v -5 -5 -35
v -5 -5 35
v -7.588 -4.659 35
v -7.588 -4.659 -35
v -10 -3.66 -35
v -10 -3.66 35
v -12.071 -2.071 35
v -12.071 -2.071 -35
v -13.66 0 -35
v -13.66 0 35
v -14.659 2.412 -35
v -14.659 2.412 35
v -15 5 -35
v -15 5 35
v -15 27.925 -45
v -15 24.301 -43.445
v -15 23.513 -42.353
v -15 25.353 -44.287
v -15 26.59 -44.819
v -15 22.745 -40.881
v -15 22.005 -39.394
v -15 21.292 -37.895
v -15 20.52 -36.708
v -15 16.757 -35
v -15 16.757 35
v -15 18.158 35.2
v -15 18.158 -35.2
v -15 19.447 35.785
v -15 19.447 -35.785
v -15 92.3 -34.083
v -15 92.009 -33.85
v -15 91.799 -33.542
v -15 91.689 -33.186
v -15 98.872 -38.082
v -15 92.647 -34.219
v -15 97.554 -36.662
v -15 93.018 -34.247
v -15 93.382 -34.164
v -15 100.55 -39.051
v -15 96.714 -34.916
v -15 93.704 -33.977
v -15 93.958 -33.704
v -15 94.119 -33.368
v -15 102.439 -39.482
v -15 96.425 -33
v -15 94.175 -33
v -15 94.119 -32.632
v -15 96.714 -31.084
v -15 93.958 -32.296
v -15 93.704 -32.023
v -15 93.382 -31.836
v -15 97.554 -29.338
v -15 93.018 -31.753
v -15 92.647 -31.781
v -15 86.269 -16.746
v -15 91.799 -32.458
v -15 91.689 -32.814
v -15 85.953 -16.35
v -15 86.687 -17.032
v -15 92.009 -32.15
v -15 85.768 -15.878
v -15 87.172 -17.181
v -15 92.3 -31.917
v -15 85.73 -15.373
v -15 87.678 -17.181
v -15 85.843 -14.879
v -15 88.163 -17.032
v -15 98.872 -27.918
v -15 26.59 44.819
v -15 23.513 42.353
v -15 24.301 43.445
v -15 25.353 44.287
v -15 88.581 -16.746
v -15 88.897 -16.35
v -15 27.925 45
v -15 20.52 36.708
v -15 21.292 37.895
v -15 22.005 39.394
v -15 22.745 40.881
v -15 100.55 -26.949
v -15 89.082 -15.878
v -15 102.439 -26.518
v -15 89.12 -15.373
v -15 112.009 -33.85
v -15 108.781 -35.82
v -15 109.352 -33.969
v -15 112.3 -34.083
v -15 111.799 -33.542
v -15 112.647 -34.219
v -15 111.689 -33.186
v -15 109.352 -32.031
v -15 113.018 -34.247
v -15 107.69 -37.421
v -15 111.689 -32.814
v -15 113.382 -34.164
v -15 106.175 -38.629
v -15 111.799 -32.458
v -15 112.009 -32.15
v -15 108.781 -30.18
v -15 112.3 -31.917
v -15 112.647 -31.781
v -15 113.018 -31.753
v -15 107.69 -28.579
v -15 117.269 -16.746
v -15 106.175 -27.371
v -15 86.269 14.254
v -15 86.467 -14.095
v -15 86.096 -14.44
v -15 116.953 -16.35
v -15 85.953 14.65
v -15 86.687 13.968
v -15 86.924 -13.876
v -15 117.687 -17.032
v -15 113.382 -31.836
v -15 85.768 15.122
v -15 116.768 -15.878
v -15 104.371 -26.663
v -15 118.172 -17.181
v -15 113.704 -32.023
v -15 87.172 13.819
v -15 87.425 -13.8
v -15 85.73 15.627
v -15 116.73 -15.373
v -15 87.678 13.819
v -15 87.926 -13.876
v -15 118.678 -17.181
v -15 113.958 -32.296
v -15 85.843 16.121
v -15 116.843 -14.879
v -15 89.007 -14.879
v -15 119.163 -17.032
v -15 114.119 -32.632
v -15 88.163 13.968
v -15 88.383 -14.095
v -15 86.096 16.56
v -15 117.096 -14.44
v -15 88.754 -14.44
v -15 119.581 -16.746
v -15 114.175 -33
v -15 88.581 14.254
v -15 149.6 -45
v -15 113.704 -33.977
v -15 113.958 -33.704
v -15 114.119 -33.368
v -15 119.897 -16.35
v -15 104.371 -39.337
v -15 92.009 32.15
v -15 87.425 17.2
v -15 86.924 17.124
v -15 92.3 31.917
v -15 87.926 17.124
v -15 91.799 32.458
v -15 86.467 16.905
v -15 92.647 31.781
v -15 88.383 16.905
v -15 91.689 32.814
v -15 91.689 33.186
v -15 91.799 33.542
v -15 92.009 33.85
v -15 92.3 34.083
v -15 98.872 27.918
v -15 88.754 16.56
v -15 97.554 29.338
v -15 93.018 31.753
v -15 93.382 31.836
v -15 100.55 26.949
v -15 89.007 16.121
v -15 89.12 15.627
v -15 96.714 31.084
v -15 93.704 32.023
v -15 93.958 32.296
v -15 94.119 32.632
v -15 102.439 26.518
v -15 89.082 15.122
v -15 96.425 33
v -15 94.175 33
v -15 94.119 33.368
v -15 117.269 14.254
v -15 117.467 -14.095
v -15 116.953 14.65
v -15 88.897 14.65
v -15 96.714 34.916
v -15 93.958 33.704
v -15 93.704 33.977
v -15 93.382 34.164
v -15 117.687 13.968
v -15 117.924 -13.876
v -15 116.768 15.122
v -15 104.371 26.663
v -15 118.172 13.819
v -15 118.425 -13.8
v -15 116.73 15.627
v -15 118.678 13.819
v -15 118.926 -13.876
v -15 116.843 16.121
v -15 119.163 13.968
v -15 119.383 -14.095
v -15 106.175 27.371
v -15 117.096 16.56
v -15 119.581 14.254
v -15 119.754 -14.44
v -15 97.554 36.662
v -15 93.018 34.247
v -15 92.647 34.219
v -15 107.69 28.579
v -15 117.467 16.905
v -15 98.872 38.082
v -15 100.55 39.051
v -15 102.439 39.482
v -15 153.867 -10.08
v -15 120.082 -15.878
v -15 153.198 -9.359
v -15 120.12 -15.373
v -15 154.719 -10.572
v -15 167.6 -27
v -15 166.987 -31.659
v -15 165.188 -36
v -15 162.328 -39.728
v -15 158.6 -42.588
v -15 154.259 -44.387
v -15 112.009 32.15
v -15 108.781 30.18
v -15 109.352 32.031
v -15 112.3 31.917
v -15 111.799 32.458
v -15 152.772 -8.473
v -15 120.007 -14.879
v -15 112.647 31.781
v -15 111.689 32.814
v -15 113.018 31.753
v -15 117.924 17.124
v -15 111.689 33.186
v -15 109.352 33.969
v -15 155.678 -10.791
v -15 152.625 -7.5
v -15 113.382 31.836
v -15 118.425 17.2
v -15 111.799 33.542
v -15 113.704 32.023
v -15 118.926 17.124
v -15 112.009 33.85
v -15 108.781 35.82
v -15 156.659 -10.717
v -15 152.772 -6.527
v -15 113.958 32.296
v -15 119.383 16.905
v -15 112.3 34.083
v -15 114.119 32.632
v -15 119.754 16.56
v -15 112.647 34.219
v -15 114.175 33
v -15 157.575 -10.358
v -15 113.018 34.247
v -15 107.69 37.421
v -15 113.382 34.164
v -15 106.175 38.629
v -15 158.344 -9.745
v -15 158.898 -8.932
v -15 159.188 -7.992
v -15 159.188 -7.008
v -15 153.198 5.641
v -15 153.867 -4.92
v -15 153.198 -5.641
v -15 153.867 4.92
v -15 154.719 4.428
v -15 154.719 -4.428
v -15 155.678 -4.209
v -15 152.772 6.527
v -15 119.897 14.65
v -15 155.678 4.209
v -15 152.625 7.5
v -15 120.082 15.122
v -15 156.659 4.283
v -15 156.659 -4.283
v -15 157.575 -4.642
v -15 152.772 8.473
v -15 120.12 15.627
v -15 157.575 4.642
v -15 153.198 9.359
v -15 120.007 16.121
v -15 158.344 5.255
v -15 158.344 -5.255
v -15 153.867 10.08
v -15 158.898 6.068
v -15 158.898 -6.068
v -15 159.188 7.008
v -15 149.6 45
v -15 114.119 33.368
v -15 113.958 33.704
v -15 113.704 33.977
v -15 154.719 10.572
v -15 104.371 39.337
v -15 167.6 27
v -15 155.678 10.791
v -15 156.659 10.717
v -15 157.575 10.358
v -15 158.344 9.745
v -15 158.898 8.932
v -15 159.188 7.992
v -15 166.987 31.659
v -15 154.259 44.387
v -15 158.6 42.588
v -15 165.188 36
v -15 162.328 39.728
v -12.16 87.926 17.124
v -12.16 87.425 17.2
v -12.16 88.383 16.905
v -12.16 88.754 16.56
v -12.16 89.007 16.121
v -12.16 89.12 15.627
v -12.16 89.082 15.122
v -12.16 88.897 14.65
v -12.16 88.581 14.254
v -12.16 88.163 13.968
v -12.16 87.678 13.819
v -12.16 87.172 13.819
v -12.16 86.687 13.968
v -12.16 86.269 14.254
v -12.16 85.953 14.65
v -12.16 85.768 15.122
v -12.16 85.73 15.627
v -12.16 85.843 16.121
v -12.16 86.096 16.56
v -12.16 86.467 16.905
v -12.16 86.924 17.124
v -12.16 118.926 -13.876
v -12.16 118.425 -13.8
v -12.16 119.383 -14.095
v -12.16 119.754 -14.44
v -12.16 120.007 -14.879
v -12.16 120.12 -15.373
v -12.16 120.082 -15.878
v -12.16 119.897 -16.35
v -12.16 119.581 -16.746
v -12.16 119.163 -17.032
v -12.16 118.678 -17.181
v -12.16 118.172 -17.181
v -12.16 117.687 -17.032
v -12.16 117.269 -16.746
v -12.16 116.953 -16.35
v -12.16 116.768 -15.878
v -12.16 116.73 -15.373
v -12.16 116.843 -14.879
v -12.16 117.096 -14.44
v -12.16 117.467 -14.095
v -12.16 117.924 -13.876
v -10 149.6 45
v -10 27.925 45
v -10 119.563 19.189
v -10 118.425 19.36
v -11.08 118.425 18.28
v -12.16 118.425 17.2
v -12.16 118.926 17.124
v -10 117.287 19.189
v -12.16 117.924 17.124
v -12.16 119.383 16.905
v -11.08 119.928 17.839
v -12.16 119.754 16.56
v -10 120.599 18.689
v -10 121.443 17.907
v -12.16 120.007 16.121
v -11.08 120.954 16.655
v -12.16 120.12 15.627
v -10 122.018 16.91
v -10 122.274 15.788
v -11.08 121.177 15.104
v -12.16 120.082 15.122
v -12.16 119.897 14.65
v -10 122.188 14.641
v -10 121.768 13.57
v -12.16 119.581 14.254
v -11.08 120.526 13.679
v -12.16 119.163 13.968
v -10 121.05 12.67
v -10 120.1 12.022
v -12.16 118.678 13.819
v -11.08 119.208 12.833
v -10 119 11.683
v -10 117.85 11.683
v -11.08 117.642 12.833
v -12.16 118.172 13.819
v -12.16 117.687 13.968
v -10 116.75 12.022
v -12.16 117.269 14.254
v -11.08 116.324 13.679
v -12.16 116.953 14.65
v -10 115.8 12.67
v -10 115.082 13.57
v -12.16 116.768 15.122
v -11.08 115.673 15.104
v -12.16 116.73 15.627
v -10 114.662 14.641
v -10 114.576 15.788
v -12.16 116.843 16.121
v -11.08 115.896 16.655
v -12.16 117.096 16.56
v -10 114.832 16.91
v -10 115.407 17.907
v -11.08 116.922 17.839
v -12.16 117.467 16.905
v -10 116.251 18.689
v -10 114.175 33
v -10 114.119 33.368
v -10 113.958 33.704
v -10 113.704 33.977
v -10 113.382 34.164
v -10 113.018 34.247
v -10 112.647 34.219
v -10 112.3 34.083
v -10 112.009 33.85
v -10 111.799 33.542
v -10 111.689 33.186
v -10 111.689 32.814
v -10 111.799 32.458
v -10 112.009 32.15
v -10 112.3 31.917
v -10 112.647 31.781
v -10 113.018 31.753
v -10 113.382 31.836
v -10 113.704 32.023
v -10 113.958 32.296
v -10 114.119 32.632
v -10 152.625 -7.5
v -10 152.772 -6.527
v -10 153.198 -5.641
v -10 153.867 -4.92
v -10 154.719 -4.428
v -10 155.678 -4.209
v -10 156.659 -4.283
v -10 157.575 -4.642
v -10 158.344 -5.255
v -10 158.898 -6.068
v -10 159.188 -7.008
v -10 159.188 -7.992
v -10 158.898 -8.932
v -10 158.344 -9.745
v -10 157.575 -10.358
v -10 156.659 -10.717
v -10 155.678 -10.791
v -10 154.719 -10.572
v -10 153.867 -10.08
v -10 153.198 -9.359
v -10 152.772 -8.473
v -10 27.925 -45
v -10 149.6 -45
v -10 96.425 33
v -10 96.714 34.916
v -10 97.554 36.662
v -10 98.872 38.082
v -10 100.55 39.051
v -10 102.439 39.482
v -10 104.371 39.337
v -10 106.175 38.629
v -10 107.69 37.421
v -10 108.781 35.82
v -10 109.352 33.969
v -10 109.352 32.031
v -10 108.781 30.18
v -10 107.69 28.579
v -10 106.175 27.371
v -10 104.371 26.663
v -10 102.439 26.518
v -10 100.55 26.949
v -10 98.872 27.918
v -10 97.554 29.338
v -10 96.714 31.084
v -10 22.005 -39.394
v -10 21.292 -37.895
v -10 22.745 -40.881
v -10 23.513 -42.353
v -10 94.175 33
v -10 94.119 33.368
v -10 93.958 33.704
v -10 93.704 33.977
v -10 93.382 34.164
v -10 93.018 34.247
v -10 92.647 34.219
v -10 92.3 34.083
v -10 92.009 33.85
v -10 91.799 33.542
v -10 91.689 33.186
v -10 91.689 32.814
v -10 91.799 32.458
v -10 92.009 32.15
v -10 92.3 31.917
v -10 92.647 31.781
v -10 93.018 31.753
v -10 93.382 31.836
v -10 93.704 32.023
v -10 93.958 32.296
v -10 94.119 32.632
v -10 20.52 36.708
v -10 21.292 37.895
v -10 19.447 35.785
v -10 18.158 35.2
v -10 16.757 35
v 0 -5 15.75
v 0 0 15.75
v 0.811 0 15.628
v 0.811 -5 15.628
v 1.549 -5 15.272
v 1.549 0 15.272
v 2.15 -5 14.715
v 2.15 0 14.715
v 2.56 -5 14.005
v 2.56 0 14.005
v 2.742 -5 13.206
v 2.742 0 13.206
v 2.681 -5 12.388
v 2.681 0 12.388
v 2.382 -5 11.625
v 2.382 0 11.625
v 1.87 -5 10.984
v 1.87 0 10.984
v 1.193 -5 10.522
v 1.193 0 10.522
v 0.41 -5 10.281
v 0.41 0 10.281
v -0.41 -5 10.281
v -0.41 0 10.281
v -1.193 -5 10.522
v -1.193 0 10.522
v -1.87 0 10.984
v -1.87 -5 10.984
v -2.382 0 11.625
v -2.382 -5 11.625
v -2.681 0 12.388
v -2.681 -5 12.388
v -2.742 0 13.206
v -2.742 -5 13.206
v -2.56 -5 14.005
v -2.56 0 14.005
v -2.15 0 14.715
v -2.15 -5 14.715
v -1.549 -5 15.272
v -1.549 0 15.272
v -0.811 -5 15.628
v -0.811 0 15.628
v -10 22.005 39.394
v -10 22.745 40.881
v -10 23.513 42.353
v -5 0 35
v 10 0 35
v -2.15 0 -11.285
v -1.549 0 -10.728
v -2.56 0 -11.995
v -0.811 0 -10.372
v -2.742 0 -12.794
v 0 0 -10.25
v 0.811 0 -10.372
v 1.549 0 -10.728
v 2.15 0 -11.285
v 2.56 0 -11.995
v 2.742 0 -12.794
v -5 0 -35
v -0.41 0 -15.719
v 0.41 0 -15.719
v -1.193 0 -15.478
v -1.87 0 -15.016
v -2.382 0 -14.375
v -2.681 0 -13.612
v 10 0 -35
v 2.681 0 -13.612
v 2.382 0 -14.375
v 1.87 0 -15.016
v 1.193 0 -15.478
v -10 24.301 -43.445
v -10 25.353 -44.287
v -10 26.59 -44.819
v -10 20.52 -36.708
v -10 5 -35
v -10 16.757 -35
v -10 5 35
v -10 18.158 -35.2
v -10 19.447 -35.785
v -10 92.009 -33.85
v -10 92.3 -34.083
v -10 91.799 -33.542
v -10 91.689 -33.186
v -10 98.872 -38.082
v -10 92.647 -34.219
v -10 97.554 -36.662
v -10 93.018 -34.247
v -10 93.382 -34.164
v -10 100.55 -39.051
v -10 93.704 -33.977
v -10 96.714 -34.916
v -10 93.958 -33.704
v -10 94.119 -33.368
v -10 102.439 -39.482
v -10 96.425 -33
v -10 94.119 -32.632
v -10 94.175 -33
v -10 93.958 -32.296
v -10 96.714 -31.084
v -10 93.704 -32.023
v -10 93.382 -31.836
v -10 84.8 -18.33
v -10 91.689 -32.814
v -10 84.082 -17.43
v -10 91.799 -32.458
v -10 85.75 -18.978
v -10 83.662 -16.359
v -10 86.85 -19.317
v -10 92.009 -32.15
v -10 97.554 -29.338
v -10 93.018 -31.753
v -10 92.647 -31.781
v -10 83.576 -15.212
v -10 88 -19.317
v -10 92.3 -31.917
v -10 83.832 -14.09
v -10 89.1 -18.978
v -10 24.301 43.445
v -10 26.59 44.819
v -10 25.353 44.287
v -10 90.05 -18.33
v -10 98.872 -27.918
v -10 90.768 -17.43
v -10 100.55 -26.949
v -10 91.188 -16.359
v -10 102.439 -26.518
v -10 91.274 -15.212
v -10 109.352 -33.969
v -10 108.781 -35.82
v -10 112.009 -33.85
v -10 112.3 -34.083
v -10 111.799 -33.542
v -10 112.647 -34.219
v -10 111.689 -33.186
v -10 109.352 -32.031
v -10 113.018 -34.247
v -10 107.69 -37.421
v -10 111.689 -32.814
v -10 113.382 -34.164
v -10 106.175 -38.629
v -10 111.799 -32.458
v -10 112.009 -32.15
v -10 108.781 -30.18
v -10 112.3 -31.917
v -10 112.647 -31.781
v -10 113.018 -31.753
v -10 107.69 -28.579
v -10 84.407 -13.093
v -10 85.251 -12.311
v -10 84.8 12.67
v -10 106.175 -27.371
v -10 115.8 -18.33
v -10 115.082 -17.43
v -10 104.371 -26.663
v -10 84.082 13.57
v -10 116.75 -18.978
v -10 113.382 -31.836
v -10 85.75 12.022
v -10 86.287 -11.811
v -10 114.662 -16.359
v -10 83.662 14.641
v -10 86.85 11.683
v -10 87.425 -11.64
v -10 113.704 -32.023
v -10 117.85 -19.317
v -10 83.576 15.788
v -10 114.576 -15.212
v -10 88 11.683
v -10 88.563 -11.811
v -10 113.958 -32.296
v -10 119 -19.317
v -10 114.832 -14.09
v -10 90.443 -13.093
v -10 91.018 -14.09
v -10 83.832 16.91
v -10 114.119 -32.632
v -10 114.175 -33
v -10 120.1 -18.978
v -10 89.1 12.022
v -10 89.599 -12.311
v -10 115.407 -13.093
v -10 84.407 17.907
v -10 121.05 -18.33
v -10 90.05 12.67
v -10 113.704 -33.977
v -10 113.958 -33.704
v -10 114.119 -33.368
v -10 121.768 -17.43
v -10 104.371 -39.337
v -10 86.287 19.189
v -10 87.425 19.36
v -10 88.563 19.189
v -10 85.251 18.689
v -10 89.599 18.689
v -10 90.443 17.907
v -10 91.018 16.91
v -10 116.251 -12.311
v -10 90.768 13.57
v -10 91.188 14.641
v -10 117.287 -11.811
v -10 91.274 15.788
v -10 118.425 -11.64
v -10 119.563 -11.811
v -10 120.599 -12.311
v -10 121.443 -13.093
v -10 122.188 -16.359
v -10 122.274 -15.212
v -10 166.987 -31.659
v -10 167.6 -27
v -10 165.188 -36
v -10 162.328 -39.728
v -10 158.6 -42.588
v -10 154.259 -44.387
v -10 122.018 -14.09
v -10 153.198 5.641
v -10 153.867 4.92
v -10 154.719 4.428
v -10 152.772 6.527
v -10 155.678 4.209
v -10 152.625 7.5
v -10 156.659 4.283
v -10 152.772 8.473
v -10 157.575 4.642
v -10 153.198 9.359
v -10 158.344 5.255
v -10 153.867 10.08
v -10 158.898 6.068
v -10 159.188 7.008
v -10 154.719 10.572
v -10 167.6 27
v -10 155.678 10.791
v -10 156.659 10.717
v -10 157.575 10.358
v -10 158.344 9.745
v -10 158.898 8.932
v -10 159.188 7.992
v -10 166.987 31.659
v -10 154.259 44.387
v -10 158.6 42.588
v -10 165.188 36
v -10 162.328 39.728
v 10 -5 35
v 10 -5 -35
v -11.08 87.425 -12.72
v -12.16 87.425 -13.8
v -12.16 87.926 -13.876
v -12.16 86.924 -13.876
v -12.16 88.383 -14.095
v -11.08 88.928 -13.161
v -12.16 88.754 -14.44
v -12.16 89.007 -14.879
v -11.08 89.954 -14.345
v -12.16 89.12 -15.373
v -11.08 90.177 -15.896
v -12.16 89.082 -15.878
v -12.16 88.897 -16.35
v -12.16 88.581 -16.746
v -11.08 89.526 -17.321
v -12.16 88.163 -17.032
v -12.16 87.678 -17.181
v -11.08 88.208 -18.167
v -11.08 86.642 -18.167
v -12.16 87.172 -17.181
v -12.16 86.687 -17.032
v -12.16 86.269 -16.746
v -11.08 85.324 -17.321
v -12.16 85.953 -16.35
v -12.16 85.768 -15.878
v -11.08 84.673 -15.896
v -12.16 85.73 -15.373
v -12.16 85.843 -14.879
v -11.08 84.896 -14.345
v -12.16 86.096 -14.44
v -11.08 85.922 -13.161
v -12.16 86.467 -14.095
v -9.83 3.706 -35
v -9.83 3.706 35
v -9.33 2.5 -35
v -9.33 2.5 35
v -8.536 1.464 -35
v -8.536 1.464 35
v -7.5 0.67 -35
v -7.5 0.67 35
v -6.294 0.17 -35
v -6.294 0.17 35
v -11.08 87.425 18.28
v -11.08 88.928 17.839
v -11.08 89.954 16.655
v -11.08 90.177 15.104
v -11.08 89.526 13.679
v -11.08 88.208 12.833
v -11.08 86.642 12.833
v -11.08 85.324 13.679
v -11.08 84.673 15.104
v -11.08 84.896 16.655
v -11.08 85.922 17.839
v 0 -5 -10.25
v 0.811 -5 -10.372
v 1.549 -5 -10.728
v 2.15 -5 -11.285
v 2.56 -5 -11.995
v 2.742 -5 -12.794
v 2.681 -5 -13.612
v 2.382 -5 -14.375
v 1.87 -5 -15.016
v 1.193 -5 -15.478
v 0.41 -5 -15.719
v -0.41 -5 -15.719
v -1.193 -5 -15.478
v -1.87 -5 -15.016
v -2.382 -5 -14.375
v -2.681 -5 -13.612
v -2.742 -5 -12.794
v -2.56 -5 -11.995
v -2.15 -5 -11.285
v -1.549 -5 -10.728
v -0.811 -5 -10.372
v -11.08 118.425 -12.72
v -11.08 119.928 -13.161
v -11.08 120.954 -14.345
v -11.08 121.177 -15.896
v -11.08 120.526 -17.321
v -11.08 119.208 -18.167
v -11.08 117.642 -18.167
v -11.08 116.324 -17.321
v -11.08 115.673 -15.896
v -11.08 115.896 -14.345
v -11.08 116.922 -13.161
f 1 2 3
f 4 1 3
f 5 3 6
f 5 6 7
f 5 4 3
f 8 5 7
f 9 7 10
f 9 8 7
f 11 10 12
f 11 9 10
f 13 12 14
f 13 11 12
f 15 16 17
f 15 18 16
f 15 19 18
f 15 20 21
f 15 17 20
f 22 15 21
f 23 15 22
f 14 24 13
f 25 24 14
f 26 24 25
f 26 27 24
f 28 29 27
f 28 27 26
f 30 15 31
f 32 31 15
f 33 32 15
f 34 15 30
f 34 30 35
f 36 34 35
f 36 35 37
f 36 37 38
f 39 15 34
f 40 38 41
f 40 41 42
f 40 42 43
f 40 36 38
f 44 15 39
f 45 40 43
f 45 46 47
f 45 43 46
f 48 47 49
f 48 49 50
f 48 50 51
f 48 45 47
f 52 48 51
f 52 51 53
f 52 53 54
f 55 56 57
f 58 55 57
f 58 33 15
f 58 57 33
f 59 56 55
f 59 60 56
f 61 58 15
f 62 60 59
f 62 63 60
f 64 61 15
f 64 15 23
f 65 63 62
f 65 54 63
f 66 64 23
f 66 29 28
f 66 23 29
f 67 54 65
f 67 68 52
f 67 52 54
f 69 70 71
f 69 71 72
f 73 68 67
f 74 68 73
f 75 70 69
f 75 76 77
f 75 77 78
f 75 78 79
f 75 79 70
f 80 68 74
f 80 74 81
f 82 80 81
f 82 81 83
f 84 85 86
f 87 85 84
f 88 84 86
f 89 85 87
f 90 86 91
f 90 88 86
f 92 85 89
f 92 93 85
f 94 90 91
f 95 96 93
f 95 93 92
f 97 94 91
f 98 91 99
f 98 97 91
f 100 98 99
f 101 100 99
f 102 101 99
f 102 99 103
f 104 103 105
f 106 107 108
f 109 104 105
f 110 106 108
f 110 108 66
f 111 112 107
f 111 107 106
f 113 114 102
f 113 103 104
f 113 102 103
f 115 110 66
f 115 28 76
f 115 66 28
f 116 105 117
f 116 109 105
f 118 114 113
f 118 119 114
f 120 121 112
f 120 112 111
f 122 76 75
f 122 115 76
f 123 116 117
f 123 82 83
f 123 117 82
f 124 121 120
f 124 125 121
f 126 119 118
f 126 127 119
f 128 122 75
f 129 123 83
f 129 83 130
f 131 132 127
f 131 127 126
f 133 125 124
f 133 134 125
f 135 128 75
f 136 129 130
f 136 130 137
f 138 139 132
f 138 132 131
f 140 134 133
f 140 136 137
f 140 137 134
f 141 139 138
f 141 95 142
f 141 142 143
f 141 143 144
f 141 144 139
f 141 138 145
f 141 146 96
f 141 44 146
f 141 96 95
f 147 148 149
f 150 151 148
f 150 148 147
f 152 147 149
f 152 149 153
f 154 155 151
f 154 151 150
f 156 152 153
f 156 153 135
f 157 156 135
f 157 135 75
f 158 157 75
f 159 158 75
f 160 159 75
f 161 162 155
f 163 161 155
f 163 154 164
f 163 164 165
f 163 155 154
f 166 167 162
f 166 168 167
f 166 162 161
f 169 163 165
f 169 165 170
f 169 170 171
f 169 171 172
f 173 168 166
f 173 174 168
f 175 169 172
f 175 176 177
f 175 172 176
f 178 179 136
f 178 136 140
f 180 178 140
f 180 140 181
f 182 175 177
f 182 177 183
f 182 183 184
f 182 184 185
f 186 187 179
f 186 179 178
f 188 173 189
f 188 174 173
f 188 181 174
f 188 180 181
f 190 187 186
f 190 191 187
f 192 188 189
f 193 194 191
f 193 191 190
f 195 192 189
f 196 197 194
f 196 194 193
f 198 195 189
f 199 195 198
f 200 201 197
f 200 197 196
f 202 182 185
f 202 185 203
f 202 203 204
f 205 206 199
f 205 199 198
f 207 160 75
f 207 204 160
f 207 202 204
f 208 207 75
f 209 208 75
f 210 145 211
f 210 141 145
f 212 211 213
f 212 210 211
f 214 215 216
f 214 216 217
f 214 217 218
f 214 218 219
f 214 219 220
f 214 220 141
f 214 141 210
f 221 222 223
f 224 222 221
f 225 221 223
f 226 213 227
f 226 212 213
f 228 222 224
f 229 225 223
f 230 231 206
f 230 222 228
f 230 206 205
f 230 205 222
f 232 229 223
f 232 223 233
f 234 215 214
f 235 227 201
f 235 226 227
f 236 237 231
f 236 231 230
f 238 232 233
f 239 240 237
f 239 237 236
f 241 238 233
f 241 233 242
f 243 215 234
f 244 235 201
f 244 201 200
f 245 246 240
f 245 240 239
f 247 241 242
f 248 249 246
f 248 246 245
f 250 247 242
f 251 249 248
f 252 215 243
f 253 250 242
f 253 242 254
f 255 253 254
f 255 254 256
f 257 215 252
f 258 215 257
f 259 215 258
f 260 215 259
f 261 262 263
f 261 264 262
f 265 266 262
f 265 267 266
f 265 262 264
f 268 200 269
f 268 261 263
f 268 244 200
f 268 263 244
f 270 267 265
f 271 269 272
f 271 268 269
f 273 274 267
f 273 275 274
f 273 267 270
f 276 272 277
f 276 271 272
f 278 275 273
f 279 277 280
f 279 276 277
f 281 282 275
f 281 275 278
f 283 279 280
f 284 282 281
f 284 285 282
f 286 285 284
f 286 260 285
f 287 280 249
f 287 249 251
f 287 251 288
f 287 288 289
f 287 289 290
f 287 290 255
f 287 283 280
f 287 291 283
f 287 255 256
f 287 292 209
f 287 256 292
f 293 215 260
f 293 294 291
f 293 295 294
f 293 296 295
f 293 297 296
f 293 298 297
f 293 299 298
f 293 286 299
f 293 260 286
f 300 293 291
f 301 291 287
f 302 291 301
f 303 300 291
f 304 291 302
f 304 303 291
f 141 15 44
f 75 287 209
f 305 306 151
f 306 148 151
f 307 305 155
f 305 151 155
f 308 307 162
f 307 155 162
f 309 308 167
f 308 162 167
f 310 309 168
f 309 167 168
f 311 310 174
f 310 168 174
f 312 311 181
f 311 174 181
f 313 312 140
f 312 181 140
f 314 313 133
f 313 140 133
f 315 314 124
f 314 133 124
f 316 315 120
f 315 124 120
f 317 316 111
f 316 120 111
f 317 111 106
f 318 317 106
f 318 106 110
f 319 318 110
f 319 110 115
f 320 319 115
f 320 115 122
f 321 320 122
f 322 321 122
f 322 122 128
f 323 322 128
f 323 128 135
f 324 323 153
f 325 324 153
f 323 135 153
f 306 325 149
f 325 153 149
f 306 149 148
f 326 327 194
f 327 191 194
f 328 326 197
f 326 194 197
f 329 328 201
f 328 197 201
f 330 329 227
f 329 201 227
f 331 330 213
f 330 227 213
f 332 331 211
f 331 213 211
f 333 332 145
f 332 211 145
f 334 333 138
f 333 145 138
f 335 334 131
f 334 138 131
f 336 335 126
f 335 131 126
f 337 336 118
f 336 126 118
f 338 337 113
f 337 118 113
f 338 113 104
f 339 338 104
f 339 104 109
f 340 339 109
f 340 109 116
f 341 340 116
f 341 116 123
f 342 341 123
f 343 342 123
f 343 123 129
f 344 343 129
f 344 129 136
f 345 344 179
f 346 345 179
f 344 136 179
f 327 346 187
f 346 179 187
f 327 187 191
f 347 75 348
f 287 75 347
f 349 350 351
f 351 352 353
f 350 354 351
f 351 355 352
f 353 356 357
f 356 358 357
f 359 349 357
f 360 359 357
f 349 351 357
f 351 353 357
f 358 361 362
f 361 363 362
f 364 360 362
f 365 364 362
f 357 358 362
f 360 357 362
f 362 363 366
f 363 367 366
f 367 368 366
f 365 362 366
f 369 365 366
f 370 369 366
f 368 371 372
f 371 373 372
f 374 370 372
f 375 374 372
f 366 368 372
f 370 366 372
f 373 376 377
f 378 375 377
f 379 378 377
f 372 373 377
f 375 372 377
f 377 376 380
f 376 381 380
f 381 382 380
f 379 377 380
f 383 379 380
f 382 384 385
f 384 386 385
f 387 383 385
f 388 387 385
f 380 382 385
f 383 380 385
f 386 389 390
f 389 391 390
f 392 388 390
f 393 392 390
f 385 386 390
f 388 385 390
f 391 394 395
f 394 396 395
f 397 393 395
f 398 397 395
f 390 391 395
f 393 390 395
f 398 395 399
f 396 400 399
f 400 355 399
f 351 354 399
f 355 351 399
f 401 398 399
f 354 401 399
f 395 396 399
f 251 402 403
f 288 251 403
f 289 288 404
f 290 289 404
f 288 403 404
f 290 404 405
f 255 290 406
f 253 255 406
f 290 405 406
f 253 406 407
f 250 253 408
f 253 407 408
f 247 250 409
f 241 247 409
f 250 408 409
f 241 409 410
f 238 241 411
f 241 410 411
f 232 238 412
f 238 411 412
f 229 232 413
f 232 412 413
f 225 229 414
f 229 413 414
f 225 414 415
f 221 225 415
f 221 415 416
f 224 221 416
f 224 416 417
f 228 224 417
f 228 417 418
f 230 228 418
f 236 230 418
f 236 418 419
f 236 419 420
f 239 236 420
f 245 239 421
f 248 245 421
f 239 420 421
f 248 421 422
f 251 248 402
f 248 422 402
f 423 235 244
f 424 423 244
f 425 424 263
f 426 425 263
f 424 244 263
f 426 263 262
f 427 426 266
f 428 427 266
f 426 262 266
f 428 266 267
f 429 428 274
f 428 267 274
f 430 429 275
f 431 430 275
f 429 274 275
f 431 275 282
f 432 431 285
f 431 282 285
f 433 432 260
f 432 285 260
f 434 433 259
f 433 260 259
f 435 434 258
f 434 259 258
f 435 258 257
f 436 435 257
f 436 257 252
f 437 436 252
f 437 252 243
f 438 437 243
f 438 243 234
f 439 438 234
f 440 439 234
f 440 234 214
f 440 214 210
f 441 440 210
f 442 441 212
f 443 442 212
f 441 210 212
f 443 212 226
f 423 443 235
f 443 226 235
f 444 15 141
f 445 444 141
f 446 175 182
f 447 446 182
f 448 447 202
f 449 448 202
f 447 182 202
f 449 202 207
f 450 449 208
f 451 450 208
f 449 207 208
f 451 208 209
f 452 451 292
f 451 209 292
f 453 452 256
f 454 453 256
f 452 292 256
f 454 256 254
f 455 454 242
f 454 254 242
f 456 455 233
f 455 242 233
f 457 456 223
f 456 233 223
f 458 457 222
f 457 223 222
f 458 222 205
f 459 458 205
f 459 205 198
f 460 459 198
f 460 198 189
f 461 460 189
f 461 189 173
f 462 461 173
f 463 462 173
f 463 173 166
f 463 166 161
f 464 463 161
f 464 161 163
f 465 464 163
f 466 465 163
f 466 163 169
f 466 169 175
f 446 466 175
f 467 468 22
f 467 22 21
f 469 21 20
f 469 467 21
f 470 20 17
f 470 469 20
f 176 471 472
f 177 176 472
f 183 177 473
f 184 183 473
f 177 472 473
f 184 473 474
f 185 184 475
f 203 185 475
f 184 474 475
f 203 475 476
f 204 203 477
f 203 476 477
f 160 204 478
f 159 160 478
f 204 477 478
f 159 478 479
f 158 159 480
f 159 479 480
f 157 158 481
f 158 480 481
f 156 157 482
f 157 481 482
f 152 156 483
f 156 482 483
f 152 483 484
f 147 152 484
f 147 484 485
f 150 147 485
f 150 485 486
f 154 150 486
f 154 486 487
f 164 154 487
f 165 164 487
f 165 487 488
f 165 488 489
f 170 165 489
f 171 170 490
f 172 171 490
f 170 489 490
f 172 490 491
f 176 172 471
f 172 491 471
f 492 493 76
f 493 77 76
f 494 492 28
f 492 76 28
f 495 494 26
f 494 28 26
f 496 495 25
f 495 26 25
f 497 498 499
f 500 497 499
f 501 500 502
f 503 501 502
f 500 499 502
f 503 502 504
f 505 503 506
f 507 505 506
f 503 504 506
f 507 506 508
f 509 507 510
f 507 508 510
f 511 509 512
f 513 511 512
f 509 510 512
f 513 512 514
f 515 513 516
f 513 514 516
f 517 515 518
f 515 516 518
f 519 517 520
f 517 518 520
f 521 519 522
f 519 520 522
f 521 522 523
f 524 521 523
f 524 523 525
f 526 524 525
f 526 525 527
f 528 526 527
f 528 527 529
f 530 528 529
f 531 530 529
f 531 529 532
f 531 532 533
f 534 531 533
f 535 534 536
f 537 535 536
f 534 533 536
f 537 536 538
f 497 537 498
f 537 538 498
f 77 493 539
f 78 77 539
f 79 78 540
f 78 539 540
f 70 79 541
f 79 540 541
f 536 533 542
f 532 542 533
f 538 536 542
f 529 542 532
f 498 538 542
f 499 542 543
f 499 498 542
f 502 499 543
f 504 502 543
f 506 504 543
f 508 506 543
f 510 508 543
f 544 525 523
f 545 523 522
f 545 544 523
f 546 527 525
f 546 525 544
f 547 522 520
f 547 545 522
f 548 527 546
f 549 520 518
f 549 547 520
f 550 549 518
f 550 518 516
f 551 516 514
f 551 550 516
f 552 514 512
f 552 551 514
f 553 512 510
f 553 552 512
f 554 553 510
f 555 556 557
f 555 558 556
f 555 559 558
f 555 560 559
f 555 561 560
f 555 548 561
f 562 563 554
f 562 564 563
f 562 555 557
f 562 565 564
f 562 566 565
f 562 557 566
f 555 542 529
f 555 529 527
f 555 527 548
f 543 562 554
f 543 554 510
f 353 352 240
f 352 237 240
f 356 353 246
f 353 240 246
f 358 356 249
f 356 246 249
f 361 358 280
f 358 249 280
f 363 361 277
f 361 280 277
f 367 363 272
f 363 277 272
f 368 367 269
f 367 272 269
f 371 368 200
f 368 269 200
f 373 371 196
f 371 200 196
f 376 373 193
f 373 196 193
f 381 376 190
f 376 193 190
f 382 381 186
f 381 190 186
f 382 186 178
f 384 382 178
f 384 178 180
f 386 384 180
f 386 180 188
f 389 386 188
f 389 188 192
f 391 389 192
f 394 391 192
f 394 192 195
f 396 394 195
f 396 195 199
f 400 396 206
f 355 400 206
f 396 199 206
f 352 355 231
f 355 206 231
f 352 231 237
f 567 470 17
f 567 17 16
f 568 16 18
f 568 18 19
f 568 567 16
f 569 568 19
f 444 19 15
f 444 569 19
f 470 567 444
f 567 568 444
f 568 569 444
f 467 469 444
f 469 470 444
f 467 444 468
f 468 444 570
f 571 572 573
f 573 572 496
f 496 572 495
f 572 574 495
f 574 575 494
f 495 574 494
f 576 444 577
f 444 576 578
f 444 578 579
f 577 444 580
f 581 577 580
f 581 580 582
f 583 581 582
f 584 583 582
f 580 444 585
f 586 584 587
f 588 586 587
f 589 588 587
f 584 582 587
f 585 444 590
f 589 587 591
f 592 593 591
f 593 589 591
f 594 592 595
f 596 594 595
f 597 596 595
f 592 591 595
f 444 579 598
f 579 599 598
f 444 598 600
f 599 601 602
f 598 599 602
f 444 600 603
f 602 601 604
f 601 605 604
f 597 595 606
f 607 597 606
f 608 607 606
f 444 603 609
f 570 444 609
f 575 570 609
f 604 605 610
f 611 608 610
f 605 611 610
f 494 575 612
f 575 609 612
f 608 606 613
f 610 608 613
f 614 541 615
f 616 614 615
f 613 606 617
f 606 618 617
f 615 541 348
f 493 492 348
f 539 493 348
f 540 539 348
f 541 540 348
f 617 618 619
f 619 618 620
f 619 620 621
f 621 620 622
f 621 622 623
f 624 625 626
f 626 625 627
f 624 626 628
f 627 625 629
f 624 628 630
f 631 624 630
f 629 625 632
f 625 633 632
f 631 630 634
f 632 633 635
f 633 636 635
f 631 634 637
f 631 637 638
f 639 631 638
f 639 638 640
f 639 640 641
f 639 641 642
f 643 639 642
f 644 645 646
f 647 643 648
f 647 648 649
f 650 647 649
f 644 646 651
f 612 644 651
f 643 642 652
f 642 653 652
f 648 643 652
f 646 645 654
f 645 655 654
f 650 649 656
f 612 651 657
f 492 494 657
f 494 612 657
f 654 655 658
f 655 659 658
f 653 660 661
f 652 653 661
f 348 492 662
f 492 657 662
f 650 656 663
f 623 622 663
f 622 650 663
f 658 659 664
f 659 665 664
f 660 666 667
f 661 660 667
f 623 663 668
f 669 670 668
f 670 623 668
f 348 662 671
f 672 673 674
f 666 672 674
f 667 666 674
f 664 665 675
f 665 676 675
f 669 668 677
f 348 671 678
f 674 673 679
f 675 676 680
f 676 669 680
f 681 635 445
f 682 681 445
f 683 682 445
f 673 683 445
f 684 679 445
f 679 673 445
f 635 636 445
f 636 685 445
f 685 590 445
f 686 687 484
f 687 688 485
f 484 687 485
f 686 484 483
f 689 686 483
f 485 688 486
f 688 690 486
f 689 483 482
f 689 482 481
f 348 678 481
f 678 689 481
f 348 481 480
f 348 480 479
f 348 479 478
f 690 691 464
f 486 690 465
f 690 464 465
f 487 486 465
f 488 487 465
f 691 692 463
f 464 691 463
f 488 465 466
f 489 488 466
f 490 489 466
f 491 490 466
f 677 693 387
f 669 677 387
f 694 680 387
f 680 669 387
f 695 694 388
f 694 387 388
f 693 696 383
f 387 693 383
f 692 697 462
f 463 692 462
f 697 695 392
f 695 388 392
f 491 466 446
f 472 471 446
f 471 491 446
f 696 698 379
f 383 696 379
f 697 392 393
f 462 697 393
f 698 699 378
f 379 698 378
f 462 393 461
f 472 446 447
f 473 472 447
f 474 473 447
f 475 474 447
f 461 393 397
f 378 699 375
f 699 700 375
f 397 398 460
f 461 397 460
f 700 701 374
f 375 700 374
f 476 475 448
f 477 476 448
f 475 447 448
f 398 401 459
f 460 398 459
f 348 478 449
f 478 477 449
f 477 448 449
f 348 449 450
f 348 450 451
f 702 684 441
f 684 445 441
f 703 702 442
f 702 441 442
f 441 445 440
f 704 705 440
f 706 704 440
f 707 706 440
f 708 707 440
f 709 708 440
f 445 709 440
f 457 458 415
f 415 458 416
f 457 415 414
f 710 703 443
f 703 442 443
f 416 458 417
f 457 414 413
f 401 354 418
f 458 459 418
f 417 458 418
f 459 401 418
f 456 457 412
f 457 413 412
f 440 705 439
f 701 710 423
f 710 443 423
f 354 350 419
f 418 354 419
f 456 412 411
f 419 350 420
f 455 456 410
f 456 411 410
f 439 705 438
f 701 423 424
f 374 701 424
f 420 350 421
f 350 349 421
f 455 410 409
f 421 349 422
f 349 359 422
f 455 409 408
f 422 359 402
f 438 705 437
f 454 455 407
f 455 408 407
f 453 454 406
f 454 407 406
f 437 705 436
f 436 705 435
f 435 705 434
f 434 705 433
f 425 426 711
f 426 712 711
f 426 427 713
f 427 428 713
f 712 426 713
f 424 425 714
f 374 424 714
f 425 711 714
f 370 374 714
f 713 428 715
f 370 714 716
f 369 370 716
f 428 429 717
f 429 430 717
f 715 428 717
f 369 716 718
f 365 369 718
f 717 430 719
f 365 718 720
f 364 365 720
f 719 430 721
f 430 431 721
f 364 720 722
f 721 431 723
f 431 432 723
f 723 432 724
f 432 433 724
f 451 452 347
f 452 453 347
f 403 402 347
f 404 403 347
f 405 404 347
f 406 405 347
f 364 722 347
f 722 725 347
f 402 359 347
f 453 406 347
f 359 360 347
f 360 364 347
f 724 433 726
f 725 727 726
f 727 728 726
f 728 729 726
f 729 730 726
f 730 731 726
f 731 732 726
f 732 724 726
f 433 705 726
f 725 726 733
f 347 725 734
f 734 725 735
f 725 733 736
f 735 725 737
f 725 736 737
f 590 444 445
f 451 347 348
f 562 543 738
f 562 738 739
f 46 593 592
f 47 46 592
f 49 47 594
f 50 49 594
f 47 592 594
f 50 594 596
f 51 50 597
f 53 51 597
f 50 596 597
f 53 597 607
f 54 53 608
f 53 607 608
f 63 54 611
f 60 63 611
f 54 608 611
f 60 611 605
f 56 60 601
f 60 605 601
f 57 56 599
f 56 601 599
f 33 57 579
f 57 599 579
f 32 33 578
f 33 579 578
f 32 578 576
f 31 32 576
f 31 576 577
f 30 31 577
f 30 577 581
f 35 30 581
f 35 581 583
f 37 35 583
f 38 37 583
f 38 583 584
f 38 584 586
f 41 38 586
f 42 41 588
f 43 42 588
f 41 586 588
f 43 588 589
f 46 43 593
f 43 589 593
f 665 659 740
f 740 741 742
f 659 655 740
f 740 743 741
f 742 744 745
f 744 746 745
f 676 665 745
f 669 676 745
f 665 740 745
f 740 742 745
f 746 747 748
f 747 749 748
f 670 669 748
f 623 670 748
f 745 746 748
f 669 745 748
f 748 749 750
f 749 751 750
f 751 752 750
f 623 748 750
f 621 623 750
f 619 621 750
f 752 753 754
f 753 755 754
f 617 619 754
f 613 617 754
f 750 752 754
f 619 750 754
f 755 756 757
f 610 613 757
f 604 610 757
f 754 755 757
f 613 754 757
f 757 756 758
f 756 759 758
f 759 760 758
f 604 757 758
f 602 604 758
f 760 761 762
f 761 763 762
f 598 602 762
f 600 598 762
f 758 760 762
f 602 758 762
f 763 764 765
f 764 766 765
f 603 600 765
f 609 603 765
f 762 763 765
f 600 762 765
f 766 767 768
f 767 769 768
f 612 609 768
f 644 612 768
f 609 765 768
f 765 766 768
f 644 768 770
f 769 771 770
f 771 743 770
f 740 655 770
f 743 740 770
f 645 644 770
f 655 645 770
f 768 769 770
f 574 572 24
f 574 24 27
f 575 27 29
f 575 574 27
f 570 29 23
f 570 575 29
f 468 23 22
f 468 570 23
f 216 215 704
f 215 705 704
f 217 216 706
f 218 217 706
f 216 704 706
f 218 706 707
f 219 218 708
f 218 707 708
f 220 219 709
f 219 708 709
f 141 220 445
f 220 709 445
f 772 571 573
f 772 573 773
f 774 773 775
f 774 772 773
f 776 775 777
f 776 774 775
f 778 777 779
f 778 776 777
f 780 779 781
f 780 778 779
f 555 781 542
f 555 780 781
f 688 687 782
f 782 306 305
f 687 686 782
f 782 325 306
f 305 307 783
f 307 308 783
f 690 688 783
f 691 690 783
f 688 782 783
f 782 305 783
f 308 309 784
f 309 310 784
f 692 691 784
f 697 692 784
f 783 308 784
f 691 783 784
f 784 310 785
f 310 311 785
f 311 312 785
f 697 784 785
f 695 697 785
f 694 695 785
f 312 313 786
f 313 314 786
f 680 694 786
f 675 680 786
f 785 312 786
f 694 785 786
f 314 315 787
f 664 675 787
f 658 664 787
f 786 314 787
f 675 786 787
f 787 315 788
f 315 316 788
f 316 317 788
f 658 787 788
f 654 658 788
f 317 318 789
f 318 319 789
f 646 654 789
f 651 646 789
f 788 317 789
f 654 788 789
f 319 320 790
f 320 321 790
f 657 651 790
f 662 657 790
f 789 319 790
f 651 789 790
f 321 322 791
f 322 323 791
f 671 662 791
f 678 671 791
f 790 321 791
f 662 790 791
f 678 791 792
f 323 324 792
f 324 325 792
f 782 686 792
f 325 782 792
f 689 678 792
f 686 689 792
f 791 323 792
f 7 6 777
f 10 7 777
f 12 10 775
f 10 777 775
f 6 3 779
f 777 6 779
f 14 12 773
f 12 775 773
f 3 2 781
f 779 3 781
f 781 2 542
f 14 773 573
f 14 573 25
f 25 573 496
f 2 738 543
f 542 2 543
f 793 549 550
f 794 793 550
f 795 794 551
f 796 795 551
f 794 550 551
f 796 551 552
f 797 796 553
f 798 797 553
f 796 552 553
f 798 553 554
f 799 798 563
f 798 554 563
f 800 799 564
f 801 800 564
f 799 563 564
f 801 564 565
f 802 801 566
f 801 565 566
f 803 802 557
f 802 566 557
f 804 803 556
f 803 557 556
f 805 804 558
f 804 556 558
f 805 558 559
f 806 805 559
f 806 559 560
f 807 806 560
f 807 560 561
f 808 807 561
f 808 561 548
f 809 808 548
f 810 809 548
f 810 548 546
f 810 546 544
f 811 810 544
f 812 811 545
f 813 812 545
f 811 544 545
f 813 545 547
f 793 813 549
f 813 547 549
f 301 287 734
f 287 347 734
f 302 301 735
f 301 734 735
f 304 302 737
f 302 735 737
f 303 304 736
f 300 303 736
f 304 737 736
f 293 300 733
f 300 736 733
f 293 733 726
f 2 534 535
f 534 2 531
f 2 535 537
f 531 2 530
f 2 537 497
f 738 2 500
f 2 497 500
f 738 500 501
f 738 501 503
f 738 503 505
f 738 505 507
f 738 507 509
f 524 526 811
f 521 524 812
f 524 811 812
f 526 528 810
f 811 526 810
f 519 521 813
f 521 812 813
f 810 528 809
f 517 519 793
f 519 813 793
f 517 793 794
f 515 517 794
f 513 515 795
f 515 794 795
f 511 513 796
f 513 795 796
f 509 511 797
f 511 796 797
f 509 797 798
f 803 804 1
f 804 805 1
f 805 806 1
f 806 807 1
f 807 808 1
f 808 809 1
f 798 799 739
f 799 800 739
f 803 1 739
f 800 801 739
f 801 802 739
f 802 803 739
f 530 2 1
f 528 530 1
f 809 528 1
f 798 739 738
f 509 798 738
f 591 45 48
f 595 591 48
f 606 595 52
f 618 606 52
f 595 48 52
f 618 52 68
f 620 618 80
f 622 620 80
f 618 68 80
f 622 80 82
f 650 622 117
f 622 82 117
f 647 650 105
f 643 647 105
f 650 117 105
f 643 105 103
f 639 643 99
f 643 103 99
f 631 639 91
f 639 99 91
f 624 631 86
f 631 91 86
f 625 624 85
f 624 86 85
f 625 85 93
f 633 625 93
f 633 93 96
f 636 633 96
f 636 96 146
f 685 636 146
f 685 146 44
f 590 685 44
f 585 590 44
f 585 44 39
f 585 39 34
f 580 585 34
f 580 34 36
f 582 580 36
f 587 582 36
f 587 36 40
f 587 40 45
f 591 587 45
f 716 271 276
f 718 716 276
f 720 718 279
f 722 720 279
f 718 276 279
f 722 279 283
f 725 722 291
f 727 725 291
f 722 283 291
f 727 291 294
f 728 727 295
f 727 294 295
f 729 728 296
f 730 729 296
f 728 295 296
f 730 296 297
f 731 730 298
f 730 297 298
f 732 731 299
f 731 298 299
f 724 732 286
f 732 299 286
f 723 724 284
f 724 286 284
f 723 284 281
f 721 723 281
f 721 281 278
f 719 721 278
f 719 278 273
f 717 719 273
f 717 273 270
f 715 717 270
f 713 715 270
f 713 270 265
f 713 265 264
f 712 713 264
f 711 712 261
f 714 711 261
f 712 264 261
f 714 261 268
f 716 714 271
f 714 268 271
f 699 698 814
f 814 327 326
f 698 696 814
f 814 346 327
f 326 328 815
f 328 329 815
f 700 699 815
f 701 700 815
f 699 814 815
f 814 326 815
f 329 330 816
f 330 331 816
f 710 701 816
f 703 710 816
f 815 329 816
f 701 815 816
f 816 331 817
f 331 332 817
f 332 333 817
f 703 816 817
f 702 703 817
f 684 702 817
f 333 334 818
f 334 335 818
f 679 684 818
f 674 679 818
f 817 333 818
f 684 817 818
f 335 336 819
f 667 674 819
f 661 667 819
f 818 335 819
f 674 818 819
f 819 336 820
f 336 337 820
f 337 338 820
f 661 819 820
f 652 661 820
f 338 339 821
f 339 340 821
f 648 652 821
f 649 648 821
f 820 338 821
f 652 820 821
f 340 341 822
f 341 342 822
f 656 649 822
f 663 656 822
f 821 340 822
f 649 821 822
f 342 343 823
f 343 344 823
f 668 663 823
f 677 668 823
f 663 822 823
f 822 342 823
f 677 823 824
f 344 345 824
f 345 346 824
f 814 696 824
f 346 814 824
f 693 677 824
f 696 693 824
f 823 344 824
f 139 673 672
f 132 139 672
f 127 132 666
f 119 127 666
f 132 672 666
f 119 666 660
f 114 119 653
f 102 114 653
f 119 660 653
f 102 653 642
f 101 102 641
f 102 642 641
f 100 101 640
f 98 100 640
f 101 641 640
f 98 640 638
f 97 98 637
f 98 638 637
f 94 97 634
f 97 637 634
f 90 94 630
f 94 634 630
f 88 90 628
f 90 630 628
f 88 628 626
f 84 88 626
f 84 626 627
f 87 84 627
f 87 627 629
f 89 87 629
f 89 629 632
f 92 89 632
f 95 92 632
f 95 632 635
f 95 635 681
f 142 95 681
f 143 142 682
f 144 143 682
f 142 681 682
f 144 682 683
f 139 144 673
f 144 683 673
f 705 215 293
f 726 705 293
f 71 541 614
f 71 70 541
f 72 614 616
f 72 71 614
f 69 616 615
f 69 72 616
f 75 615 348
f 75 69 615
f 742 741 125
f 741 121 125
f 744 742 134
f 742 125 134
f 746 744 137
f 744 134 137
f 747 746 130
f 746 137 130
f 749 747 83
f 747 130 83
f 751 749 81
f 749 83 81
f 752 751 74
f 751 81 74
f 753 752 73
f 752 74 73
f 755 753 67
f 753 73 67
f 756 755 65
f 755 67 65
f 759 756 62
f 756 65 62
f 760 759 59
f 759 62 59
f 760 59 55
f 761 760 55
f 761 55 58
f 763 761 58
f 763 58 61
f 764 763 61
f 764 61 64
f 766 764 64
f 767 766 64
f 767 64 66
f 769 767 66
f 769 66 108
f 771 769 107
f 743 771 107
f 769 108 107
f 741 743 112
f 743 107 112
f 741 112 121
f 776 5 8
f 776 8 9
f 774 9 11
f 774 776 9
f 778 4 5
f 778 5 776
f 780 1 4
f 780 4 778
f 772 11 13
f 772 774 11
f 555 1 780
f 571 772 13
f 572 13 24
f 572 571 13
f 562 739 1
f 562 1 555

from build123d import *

# Parameters (mm, degrees)
ESBO_O1_W                                           = 20
ESBO_O1_H                                           = 70
FLANGE_BASE1_DEPTH                                  = 5
ARESTA_FLANGE1_STRIP_W                              = 30
ARESTA_FLANGE1_STRIP_H                              = 5
ARESTA_FLANGE1_STRIP_CUT_DEPTH                      = 70
ARESTA_FLANGE1_DEPTH                                = 70
ARESTA_FLANGE1_START                                = 5
ARESTA_FLANGE1_PROFILE_W                            = 90
ARESTA_FLANGE1_PROFILE_H                            = 162.6
ARESTA_FLANGE1_FLAT_DEPTH                           = 5
CORTE_EXTRUS_O1_DEPTH                               = 5
CORTE_EXTRUS_O2_DEPTH                               = 5
FILETE1_R                                           = 5
FILETE2_R                                           = 5
CORTE_EXTRUS_O3_REACH                               = 177.328
ESBO_O14_R                                          = 6.5
FILETE3_R                                           = 18
FILETE4_R                                           = 18
ESBO_O27_R                                          = 3.3
CORTE_EXTRUS_O4_DEPTH                               = 5
ESBO_O28_R                                          = 2.75
CORTE_EXTRUS_O5_DEPTH                               = 5
ESCAREADO_PARA_PARAFUSO_ALLEN_SEXTAVADO_D           = 3.4
ESCAREADO_PARA_PARAFUSO_ALLEN_SEXTAVADO_CSINK_D     = 7.72
ESCAREADO_PARA_PARAFUSO_ALLEN_SEXTAVADO_CSINK_ANGLE = 90
ESBO_O34_R                                          = 1.25
CORTE_EXTRUS_O6_DEPTH                               = 5


# Sheet-metal steps are written as plain solids
with BuildPart() as part:
    # Esboço1 → Flange-base1 (new body)
    with BuildSketch(Plane(origin=(0, 0, 0), x_dir=(1, 0, 0), z_dir=(0, 1, 0))):
        Rectangle(ESBO_O1_W, ESBO_O1_H)
    extrude(amount=-FLANGE_BASE1_DEPTH)

    # Aresta-Flange1 strip (across the edge) → Aresta-Flange1 strip cut (cut)
    with BuildSketch(Plane(origin=(-10, 0, -35), x_dir=(1, 0, 0), z_dir=(0, 0, 1))):
        with Locations((-10, -2.5)):
            Rectangle(ARESTA_FLANGE1_STRIP_W, ARESTA_FLANGE1_STRIP_H)
    extrude(amount=ARESTA_FLANGE1_STRIP_CUT_DEPTH, mode=Mode.SUBTRACT)

    # Aresta-Flange1 bend section (across the edge) → Aresta-Flange1 (add)
    with BuildSketch(Plane(origin=(-10, 0, -35), x_dir=(1, 0, 0), z_dir=(0, 0, 1))):
        with BuildLine():
            Line((-5, 5), (0, 5))
            ThreePointArc((0, 5), (1.464466094, 1.464466094), (5, 0))
            Line((5, 0), (5, -5))
            ThreePointArc((5, -5), (-2.071067812, -2.071067812), (-5, 5))
        make_face()
    extrude(amount=ARESTA_FLANGE1_DEPTH)

    # Aresta-Flange1 profile (on flange) → Aresta-Flange1 flat (add)
    with BuildSketch(Plane.ZY.offset(10).offset(ARESTA_FLANGE1_START)):
        with Locations((0, 86.3)):
            Rectangle(ARESTA_FLANGE1_PROFILE_W, ARESTA_FLANGE1_PROFILE_H)
    extrude(amount=-ARESTA_FLANGE1_FLAT_DEPTH)

    # Esboço11 → Corte-extrusão1 (cut)
    with BuildSketch(Plane(origin=(-10, 0, 0), x_dir=(0, 0, -1), z_dir=(1, 0, 0))):
        with BuildLine():
            Line((35, 5.5), (35, 16.756560302))
            ThreePointArc((35, 16.756560302), (35.785363848, 19.446698236), (37.894736842, 21.291741339))
            ThreePointArc((37.894736842, 21.291741339), (40.139210452, 22.371640143), (42.352941176, 23.513235294))
            ThreePointArc((42.352941176, 23.513235294), (44.287464629, 25.352521223), (45, 27.925))
            Line((45, 27.925), (45, 5))
            Line((45, 5), (35, 5))
            Line((35, 5), (35, 5.5))
        make_face()
    extrude(amount=-CORTE_EXTRUS_O1_DEPTH, mode=Mode.SUBTRACT)

    # Esboço12 → Corte-extrusão2 (cut)
    with BuildSketch(Plane(origin=(-10, 0, 0), x_dir=(0, 0, -1), z_dir=(1, 0, 0))):
        with BuildLine():
            Line((-45, 5), (-35, 5))
            Line((-35, 5), (-35, 20.009380241))
            ThreePointArc((-35, 20.009380241), (-40.077219356, 22.340780151), (-45, 24.982713659))
            Line((-45, 24.982713659), (-45, 5))
        make_face()
    extrude(amount=-CORTE_EXTRUS_O2_DEPTH, mode=Mode.SUBTRACT)

    # Filete1
    filete1_edges = [part.edges().sort_by_distance(p)[0] for p in [
        (-12.5, 20.009380241, 35),
    ]]
    fillet(filete1_edges, radius=FILETE1_R)

    # Filete2
    filete2_edges = [part.edges().sort_by_distance(p)[0] for p in [
        (-12.5, 24.982713659, 45),
    ]]
    fillet(filete2_edges, radius=FILETE2_R)

    # Esboço14 → Corte-extrusão3 (cut, up to next)
    with BuildSketch(Plane.ZY.offset(15), mode=Mode.PRIVATE) as corte_extrus_o3_sk1:
        with Locations(Location((-33, 102.925, 0), (0, 0, 270))):
            Circle(ESBO_O14_R)
    corte_extrus_o3_tool1 = extrude(corte_extrus_o3_sk1.sketch, amount=-CORTE_EXTRUS_O3_REACH, mode=Mode.PRIVATE) & part.part
    # Esboço14 → Corte-extrusão3 (cut, up to next)
    with BuildSketch(Plane.ZY.offset(15), mode=Mode.PRIVATE) as corte_extrus_o3_sk2:
        with Locations(Location((33, 102.925, 0), (0, 0, 270))):
            Circle(ESBO_O14_R)
    corte_extrus_o3_tool2 = extrude(corte_extrus_o3_sk2.sketch, amount=-CORTE_EXTRUS_O3_REACH, mode=Mode.PRIVATE) & part.part
    add(corte_extrus_o3_tool1.solids().sort_by_distance((-15, 102.925, -33))[0], mode=Mode.SUBTRACT)
    add(corte_extrus_o3_tool2.solids().sort_by_distance((-15, 102.925, 33))[0], mode=Mode.SUBTRACT)

    # Filete3
    filete3_edges = [part.edges().sort_by_distance(p)[0] for p in [
        (-12.5, 167.6, 45),
    ]]
    fillet(filete3_edges, radius=FILETE3_R)

    # Filete4
    filete4_edges = [part.edges().sort_by_distance(p)[0] for p in [
        (-12.5, 167.6, -45),
    ]]
    fillet(filete4_edges, radius=FILETE4_R)

    # Esboço27 → Corte-extrusão4 (cut)
    with BuildSketch(Plane.ZY.offset(15)):
        with Locations(Location((7.5, 155.925, 0), (0, 0, 270))):
            Circle(ESBO_O27_R)
        with Locations(Location((-7.5, 155.925, 0), (0, 0, 270))):
            Circle(ESBO_O27_R)
    extrude(amount=-CORTE_EXTRUS_O4_DEPTH, mode=Mode.SUBTRACT)

    # Esboço28 → Corte-extrusão5 (cut)
    with BuildSketch(Plane(origin=(0, 0, 0), x_dir=(1, 0, 0), z_dir=(0, 1, 0))):
        with Locations(Location((0, 13, 0), (0, 0, 270))):
            Circle(ESBO_O28_R)
        with Locations(Location((0, -13, 0), (0, 0, 270))):
            Circle(ESBO_O28_R)
    extrude(amount=-CORTE_EXTRUS_O5_DEPTH, mode=Mode.SUBTRACT)

    # Escareado para parafuso Allen sextavado escareado de M32 (through all)
    with Locations(Plane(origin=(-10, 0, 0), x_dir=(0, 0, -1), z_dir=(1, 0, 0))):
        with Locations((-15.5, 87.425), (-15.5, 118.425), (15.5, 118.425), (15.5, 87.425)):
            CounterSinkHole(ESCAREADO_PARA_PARAFUSO_ALLEN_SEXTAVADO_D / 2, ESCAREADO_PARA_PARAFUSO_ALLEN_SEXTAVADO_CSINK_D / 2, counter_sink_angle=ESCAREADO_PARA_PARAFUSO_ALLEN_SEXTAVADO_CSINK_ANGLE)

    # Esboço34 → Corte-extrusão6 (cut)
    with BuildSketch(Plane(origin=(-10, 0, 0), x_dir=(0, 0, -1), z_dir=(1, 0, 0))):
        with Locations(Location((-33, 112.924999999, 0), (0, 0, 90))):
            Circle(ESBO_O34_R)
        with Locations(Location((-33, 92.924999999, 0), (0, 0, 90))):
            Circle(ESBO_O34_R)
        with Locations(Location((33, 112.924999999, 0), (0, 0, 90))):
            Circle(ESBO_O34_R)
        with Locations(Location((33, 92.924999999, 0), (0, 0, 90))):
            Circle(ESBO_O34_R)
    extrude(amount=-CORTE_EXTRUS_O6_DEPTH, mode=Mode.SUBTRACT)


solid = part.part
